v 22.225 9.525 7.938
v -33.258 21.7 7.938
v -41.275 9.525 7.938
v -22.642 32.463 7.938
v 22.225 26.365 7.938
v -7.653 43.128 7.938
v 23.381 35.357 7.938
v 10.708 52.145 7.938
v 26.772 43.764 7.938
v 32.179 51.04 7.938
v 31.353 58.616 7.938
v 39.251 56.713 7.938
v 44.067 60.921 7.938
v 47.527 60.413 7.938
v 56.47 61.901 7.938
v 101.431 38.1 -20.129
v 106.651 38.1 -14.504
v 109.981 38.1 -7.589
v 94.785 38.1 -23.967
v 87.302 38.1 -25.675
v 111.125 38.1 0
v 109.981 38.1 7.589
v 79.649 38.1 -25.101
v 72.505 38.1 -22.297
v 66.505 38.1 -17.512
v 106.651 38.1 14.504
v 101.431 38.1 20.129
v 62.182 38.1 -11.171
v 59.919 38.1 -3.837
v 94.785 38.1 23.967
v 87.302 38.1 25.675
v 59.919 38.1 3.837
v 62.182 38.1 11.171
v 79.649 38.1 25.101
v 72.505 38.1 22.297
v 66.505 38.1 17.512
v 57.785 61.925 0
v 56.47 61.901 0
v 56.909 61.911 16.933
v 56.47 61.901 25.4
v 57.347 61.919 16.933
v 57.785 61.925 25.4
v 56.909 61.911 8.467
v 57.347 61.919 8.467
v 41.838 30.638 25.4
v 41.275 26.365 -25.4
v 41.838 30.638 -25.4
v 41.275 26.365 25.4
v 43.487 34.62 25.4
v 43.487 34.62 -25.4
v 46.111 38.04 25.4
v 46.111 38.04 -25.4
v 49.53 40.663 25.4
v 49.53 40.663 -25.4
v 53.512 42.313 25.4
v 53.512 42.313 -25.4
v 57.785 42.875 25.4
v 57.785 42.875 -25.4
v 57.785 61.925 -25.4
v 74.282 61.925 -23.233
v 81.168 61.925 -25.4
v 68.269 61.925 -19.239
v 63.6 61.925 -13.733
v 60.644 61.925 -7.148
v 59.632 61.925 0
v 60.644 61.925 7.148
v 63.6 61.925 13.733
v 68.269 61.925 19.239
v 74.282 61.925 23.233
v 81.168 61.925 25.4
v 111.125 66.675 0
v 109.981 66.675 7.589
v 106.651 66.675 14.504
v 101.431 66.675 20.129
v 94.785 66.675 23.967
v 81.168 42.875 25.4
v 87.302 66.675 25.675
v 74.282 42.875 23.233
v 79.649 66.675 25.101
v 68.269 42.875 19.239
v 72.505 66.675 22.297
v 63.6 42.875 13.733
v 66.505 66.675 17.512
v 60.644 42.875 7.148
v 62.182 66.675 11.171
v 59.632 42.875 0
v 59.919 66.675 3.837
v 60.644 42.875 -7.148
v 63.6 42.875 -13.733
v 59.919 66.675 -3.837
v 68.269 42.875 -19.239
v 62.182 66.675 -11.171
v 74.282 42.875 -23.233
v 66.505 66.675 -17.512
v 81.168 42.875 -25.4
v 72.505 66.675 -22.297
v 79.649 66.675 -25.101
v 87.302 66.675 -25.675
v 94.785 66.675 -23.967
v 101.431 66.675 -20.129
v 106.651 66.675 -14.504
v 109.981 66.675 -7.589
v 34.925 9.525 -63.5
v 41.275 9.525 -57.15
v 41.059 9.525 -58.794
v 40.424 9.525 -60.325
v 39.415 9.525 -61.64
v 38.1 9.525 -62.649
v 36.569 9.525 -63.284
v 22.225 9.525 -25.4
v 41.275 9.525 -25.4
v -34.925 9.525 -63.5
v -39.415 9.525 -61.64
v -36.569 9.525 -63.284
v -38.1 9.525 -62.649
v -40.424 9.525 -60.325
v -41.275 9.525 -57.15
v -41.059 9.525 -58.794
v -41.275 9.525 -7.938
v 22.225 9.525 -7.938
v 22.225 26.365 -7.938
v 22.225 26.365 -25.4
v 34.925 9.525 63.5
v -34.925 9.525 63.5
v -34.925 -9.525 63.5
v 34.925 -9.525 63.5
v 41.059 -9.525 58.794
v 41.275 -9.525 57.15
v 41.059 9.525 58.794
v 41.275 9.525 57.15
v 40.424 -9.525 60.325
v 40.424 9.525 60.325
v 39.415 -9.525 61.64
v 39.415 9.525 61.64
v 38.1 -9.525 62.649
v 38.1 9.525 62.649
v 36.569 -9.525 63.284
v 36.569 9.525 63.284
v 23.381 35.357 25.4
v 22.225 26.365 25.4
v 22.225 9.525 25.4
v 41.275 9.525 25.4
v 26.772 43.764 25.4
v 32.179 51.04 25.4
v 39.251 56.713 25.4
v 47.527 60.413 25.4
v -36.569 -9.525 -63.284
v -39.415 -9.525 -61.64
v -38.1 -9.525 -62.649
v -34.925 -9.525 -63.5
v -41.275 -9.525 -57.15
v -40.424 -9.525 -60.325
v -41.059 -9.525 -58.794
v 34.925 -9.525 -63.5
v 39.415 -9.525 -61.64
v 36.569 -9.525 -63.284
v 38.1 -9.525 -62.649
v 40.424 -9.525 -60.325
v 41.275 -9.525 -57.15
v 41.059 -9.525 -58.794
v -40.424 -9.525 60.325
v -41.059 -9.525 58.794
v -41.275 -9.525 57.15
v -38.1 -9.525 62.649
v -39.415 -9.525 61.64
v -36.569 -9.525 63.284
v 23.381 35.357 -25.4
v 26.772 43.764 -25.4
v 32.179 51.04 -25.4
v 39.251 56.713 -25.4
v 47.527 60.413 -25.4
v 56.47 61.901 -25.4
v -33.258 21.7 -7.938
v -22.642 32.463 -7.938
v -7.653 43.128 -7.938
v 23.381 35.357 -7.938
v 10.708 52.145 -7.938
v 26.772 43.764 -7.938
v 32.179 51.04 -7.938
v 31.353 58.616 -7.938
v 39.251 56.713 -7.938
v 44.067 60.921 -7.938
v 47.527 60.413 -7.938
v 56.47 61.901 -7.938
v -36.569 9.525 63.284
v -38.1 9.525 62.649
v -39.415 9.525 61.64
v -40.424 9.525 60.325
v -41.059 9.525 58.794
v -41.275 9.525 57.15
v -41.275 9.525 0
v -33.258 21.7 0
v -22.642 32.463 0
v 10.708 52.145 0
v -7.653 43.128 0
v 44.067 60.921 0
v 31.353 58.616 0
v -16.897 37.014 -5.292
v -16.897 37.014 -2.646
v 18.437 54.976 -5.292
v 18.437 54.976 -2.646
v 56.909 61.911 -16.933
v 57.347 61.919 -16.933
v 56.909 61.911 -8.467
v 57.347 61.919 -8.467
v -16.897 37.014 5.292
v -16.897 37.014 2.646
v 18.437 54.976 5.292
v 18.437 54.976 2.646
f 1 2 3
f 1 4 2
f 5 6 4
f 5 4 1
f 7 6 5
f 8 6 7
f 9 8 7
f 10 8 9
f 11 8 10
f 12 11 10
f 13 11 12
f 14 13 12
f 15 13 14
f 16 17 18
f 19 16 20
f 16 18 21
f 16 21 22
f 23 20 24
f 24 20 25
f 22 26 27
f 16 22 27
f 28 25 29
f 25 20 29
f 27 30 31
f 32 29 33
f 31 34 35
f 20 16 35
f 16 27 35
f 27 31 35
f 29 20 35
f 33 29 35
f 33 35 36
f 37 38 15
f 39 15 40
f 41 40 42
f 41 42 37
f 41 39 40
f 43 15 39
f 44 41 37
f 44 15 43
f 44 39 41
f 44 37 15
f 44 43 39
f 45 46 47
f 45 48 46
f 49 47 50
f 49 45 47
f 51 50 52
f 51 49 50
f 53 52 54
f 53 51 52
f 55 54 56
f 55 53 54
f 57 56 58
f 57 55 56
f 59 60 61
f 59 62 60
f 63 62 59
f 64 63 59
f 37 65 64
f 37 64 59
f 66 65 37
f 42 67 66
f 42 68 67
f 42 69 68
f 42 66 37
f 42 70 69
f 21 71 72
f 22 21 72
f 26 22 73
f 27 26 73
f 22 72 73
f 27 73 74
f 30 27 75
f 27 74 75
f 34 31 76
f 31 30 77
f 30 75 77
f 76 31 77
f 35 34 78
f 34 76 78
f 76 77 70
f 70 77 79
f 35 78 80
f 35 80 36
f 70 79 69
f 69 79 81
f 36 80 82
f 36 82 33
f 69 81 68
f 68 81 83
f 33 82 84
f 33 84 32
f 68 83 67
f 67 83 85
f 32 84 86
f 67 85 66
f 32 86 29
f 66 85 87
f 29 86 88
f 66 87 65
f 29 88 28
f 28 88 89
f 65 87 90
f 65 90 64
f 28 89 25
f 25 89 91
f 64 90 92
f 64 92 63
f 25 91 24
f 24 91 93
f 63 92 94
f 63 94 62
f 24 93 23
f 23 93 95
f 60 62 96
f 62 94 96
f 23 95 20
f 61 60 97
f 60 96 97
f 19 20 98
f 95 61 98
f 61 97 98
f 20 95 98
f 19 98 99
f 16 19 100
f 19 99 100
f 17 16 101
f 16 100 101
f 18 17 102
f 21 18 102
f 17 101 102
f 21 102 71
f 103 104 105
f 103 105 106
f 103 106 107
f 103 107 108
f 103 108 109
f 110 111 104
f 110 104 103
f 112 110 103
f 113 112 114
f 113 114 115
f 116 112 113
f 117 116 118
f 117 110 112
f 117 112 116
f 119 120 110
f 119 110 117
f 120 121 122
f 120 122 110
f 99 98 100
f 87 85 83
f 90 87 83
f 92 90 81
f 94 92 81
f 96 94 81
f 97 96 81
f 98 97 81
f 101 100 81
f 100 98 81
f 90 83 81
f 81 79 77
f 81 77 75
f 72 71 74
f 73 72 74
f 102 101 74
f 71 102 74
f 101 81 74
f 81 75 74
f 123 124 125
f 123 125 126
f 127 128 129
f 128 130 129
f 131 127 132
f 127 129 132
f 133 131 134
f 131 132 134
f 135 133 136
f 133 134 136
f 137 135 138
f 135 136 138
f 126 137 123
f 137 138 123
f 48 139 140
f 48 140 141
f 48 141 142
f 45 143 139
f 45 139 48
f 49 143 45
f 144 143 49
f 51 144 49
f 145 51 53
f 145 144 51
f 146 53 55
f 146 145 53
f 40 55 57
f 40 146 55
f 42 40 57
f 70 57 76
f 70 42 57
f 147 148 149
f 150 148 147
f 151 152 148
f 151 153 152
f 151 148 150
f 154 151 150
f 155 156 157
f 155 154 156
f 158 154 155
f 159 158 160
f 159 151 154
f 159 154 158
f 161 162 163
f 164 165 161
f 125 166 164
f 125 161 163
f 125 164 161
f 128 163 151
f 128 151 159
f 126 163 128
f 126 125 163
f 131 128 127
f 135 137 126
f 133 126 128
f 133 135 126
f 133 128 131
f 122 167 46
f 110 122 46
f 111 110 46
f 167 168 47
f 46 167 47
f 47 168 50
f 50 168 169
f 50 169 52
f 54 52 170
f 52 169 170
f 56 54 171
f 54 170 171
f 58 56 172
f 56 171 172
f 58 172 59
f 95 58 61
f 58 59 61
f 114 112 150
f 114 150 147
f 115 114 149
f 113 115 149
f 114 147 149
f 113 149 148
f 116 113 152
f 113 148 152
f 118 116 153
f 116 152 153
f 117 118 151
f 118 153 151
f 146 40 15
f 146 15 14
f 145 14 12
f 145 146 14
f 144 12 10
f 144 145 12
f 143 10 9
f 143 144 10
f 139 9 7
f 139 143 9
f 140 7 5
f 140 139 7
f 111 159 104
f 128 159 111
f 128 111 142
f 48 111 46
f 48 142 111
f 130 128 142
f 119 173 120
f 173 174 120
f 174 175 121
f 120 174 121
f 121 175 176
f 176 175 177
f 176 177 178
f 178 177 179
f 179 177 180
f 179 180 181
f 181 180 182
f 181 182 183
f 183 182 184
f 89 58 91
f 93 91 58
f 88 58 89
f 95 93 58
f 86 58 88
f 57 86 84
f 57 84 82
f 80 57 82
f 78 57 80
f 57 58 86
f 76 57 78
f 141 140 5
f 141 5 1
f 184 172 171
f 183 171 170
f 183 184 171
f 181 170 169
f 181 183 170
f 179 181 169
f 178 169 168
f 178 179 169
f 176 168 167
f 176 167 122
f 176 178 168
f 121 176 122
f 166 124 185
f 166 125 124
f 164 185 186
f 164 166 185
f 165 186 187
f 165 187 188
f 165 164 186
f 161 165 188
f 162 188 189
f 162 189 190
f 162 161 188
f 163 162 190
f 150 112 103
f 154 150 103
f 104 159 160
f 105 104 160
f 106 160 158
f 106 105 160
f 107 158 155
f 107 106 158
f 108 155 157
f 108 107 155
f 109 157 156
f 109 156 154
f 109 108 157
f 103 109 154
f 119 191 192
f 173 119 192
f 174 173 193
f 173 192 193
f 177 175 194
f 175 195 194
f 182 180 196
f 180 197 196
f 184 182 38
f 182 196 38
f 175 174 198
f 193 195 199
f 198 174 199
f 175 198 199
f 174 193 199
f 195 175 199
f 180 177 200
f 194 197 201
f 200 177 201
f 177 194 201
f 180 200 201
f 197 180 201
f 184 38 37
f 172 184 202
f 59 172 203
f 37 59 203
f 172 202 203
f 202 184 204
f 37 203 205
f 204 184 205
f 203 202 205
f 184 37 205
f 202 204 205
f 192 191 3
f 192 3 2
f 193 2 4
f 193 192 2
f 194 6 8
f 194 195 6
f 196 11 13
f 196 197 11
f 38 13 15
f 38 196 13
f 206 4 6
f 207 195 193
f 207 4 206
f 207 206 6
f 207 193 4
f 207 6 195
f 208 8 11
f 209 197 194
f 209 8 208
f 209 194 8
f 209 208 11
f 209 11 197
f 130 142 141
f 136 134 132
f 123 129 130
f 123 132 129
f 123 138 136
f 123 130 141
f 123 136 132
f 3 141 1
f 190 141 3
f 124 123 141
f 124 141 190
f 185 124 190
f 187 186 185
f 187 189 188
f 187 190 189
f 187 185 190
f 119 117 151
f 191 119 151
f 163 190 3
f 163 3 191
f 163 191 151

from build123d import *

# Parameters (mm, degrees)
F1_DEPTH = 63.5
F0_W     = 25.0534382343
F0_H     = 19.05
F2_DEPTH = 25.4
F3_DEPTH = 7.9375
F5_R     = 6.35


with BuildPart() as f1:
    # F0 (on Top) → F1 (new body, symmetric)
    with BuildSketch(Plane.XY):
        Polygon((41.275, -9.525), (41.275, 9.525), (22.225, 9.525), (-41.275, 9.525), (-41.275, -9.525), align=None)
    extrude(amount=F1_DEPTH, both=True)

    # F0 (on Top) → F2 (join, symmetric)
    with BuildSketch(Plane.XY):
        with Locations((72.8517191172, 52.4002)):
            Rectangle(F0_W, F0_H)
        with BuildLine():
            Line((22.225, 9.525), (41.275, 9.525))
            Line((41.275, 9.525), (41.275, 26.3652))
            ThreePointArc((41.275, 26.3652), (46.1106670426, 38.0395329574), (57.785, 42.8752))
            Line((57.785, 42.8752), (60.325, 42.8752))
            Line((60.325, 42.8752), (60.325, 61.9252))
            Line((60.325, 61.9252), (57.785, 61.9252))
            add(Edge.make_bspline(
                [(56.4696013906, 61.9008627418), (56.9092910468, 61.9116915586), (57.3477786791, 61.9198078997), (57.785, 61.9252)],
                knots=[110.7361578147, 110.7361578147, 110.7361578147, 110.7361578147, 112.0654476636, 112.0654476636, 112.0654476636, 112.0654476636], degree=3))
            ThreePointArc((56.4696013906, 61.9008627418), (32.1794422581, 51.0404712797), (22.225, 26.3652))
            Line((22.225, 26.3652), (22.225, 9.525))
        make_face()
    extrude(amount=F2_DEPTH, both=True)

    # F0 (on Top) → F3 (join, symmetric)
    with BuildSketch(Plane.XY):
        with BuildLine():
            Line((-41.275, 9.525), (22.225, 9.525))
            Line((22.225, 9.525), (22.225, 26.3652))
            ThreePointArc((22.225, 26.3652), (32.1794422581, 51.0404712797), (56.4696013906, 61.9008627418))
            add(Edge.make_bspline(
                [(-41.275, 9.525), (-25.1285349977, 41.2729627023), (19.8413647419, 60.9987708748), (56.4696013906, 61.9008627418)],
                knots=[0, 0, 0, 0, 110.7361578147, 110.7361578147, 110.7361578147, 110.7361578147], degree=3))
        make_face()
    extrude(amount=F3_DEPTH, both=True)

    # F0 (on Top) → F4 (revolve)
    with BuildSketch(Plane.XY):
        Polygon((85.3784382343, 61.9252), (85.3784382343, 42.8752), (85.3784382343, 38.1), (111.125, 38.1), (111.125, 66.675), (85.3784382343, 66.675), align=None)
    revolve(axis=Axis((85.3784382343, 52.3875, 0), (0, -1, 0)))

    # F5
    f5_edges = [f1.edges().sort_by_distance(p)[0] for p in [
        (41.275, 0, 63.5),
        (-41.275, 0, 63.5),
        (41.275, 0, -63.5),
        (-41.275, 0, -63.5),
    ]]
    fillet(f5_edges, radius=F5_R)


solid = f1.part
